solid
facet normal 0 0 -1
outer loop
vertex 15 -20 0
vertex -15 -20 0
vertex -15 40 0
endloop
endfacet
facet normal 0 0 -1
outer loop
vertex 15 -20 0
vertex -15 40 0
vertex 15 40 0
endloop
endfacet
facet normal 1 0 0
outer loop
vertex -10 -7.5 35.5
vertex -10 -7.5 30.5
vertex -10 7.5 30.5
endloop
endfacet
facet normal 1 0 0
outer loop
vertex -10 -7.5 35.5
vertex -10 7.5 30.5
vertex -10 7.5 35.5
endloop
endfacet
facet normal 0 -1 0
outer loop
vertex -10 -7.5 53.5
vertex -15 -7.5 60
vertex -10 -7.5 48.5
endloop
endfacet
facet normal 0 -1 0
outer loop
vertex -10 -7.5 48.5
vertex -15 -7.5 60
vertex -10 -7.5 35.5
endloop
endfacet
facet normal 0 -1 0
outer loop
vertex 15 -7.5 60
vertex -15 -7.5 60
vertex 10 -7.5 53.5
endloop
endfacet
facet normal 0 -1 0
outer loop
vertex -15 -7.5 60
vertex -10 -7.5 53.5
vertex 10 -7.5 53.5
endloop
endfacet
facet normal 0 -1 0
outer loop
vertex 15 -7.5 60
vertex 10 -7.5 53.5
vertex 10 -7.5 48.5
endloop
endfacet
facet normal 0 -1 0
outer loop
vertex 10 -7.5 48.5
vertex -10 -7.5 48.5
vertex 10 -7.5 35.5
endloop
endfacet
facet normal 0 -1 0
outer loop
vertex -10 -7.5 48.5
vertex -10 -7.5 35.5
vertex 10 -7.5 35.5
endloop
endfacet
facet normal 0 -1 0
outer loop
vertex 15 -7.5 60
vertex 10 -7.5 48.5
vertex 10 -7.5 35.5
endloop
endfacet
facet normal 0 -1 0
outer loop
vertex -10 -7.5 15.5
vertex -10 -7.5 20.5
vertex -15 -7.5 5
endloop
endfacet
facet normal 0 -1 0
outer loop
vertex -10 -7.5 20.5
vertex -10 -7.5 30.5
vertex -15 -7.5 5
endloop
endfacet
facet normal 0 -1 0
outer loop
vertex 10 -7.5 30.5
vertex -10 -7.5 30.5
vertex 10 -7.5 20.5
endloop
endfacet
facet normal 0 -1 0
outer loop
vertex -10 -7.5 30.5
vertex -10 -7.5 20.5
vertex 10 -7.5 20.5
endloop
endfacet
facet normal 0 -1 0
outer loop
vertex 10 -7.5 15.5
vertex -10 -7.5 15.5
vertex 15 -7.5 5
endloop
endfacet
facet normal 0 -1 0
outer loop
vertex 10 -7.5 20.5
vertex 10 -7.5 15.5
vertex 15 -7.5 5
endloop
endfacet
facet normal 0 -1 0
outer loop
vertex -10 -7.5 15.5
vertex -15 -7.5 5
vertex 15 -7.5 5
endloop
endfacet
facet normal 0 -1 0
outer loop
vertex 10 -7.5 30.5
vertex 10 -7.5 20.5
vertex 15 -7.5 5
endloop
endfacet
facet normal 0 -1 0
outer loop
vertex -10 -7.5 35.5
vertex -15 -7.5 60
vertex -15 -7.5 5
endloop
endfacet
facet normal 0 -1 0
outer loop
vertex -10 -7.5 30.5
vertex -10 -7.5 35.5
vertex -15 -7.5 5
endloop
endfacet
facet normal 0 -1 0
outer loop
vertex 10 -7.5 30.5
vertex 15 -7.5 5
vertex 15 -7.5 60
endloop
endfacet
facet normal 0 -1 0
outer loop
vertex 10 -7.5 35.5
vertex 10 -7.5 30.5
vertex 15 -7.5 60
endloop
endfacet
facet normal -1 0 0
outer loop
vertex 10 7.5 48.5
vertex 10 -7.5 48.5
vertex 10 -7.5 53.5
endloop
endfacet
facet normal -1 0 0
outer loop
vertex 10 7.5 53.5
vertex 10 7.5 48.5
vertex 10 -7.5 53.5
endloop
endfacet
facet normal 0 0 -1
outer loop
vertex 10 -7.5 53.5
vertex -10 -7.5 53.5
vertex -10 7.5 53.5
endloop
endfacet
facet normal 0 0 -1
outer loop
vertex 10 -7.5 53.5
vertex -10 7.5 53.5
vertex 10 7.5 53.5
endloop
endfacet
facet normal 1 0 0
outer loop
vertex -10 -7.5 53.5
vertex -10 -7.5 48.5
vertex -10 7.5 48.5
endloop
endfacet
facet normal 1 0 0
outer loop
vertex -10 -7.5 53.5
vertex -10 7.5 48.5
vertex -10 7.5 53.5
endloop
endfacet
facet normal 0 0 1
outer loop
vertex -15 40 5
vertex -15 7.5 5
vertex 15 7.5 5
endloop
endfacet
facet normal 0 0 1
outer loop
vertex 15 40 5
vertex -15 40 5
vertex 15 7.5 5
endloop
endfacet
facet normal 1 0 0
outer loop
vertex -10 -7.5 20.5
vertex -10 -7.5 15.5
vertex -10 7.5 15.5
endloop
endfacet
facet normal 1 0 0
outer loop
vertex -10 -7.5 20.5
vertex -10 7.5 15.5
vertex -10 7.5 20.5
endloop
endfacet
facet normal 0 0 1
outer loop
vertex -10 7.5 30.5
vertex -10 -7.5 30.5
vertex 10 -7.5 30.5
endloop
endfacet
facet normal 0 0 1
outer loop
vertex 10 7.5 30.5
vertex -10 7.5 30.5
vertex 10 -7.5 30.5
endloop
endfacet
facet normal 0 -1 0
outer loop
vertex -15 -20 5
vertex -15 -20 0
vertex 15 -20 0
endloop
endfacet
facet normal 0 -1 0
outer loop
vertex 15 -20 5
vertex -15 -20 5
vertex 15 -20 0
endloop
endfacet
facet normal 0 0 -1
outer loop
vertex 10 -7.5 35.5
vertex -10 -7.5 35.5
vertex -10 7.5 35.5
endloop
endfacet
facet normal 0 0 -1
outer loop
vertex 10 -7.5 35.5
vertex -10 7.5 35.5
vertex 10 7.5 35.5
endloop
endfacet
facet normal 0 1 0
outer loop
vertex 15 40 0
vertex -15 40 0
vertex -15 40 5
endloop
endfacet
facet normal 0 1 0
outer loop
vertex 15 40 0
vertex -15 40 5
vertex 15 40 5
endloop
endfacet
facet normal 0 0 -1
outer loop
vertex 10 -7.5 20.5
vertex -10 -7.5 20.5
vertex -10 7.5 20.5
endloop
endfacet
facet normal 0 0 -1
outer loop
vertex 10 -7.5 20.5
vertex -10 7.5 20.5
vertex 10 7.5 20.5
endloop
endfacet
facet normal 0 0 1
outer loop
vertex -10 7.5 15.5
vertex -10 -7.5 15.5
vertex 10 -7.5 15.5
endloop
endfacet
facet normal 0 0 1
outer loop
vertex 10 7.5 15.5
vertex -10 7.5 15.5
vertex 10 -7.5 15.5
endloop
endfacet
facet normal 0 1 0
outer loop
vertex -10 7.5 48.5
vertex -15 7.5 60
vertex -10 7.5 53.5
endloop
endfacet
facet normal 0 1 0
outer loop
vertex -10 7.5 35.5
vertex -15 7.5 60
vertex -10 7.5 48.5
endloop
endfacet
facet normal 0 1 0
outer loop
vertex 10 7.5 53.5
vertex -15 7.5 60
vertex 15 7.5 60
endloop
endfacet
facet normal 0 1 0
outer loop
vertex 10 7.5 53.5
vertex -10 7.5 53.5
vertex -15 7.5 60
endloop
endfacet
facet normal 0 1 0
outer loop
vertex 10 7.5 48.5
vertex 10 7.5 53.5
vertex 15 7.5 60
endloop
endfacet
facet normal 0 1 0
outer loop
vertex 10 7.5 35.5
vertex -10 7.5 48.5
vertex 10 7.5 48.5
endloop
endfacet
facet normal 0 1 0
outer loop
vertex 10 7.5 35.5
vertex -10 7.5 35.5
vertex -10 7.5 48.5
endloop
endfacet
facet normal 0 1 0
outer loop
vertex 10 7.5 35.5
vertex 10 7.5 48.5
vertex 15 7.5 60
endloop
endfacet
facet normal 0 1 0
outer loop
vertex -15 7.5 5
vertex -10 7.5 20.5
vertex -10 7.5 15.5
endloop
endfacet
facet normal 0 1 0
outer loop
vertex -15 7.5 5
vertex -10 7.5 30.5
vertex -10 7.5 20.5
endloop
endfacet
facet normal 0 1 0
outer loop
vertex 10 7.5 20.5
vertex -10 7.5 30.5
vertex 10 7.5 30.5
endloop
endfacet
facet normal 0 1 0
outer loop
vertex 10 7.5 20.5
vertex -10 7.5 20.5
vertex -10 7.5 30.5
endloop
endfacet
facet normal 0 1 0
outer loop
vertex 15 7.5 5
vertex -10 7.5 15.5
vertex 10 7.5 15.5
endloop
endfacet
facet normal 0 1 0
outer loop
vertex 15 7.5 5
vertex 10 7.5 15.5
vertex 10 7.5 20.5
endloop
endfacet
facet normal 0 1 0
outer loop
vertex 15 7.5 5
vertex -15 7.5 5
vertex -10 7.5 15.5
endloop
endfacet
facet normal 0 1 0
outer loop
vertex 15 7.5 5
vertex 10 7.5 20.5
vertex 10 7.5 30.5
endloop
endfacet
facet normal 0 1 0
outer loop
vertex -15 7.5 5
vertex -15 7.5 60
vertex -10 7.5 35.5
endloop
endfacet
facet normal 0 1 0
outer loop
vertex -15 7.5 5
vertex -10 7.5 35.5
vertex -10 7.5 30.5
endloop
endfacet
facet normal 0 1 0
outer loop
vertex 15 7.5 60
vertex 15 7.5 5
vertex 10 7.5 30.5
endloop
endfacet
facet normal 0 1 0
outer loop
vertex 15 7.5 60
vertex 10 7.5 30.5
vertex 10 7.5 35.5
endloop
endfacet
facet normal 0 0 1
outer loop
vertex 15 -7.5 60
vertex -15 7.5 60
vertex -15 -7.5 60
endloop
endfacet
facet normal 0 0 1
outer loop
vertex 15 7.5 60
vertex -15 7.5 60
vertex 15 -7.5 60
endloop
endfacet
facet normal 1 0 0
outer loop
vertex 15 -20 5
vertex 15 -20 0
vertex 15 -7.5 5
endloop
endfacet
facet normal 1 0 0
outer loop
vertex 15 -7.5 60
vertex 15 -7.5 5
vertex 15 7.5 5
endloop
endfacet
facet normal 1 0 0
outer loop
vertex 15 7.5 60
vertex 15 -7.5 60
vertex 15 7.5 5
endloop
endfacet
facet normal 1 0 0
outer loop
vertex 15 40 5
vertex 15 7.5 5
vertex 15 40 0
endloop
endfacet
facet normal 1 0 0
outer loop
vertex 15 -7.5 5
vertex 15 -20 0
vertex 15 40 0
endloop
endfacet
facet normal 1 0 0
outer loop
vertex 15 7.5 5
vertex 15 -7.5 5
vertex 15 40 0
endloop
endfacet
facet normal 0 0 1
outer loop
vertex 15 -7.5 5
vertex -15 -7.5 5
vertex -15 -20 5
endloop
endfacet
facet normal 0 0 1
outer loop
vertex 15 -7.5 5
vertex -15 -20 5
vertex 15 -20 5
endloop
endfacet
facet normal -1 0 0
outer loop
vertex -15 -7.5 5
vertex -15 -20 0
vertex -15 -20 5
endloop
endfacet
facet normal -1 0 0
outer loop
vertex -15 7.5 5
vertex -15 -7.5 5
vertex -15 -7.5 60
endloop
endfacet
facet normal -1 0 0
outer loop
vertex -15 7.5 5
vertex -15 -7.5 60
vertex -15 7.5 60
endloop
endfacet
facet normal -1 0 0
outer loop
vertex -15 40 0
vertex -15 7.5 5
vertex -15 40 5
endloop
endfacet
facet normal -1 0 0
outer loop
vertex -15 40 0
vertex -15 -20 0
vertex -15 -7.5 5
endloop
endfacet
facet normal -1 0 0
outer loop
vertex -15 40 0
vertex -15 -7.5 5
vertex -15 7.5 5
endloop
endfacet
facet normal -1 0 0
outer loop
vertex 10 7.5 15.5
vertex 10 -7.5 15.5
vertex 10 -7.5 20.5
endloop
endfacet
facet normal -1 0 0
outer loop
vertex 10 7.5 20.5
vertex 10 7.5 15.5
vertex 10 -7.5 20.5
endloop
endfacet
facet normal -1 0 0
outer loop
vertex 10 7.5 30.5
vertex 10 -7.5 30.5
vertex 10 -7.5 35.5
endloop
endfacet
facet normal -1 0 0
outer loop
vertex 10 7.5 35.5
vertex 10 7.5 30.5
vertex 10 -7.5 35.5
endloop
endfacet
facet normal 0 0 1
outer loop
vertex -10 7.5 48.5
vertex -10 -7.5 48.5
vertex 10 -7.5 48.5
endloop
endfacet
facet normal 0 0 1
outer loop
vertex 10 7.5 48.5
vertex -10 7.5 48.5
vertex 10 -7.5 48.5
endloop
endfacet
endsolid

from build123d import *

# Parameters (mm, degrees)
F2_W     = 30
F2_H     = 60
F3_DEPTH = 5
F4_W     = 30
F4_H     = 15
F5_DEPTH = 55
F6_W     = 20
F6_H     = 5
F7_DEPTH = 47.501


with BuildPart() as f3:
    # F2 (on Top) → F3 (new body)
    with BuildSketch(Plane.XY):
        with Locations((0, 10)):
            Rectangle(F2_W, F2_H)
    extrude(amount=F3_DEPTH)

    # F4 (on face) → F5 (join)
    with BuildSketch(Plane.XY.offset(5)):
        Rectangle(F4_W, F4_H)
    extrude(amount=F5_DEPTH)

    # F6 (on face) → F7 (cut, through all)
    with BuildSketch(Plane.XZ.offset(7.5)):
        with Locations((0, 51)):
            Rectangle(F6_W, F6_H)
        with Locations((0, 33)):
            Rectangle(F6_W, F6_H)
        with Locations((0, 18)):
            Rectangle(F6_W, F6_H)
    extrude(amount=-F7_DEPTH, mode=Mode.SUBTRACT)


solid = f3.part
